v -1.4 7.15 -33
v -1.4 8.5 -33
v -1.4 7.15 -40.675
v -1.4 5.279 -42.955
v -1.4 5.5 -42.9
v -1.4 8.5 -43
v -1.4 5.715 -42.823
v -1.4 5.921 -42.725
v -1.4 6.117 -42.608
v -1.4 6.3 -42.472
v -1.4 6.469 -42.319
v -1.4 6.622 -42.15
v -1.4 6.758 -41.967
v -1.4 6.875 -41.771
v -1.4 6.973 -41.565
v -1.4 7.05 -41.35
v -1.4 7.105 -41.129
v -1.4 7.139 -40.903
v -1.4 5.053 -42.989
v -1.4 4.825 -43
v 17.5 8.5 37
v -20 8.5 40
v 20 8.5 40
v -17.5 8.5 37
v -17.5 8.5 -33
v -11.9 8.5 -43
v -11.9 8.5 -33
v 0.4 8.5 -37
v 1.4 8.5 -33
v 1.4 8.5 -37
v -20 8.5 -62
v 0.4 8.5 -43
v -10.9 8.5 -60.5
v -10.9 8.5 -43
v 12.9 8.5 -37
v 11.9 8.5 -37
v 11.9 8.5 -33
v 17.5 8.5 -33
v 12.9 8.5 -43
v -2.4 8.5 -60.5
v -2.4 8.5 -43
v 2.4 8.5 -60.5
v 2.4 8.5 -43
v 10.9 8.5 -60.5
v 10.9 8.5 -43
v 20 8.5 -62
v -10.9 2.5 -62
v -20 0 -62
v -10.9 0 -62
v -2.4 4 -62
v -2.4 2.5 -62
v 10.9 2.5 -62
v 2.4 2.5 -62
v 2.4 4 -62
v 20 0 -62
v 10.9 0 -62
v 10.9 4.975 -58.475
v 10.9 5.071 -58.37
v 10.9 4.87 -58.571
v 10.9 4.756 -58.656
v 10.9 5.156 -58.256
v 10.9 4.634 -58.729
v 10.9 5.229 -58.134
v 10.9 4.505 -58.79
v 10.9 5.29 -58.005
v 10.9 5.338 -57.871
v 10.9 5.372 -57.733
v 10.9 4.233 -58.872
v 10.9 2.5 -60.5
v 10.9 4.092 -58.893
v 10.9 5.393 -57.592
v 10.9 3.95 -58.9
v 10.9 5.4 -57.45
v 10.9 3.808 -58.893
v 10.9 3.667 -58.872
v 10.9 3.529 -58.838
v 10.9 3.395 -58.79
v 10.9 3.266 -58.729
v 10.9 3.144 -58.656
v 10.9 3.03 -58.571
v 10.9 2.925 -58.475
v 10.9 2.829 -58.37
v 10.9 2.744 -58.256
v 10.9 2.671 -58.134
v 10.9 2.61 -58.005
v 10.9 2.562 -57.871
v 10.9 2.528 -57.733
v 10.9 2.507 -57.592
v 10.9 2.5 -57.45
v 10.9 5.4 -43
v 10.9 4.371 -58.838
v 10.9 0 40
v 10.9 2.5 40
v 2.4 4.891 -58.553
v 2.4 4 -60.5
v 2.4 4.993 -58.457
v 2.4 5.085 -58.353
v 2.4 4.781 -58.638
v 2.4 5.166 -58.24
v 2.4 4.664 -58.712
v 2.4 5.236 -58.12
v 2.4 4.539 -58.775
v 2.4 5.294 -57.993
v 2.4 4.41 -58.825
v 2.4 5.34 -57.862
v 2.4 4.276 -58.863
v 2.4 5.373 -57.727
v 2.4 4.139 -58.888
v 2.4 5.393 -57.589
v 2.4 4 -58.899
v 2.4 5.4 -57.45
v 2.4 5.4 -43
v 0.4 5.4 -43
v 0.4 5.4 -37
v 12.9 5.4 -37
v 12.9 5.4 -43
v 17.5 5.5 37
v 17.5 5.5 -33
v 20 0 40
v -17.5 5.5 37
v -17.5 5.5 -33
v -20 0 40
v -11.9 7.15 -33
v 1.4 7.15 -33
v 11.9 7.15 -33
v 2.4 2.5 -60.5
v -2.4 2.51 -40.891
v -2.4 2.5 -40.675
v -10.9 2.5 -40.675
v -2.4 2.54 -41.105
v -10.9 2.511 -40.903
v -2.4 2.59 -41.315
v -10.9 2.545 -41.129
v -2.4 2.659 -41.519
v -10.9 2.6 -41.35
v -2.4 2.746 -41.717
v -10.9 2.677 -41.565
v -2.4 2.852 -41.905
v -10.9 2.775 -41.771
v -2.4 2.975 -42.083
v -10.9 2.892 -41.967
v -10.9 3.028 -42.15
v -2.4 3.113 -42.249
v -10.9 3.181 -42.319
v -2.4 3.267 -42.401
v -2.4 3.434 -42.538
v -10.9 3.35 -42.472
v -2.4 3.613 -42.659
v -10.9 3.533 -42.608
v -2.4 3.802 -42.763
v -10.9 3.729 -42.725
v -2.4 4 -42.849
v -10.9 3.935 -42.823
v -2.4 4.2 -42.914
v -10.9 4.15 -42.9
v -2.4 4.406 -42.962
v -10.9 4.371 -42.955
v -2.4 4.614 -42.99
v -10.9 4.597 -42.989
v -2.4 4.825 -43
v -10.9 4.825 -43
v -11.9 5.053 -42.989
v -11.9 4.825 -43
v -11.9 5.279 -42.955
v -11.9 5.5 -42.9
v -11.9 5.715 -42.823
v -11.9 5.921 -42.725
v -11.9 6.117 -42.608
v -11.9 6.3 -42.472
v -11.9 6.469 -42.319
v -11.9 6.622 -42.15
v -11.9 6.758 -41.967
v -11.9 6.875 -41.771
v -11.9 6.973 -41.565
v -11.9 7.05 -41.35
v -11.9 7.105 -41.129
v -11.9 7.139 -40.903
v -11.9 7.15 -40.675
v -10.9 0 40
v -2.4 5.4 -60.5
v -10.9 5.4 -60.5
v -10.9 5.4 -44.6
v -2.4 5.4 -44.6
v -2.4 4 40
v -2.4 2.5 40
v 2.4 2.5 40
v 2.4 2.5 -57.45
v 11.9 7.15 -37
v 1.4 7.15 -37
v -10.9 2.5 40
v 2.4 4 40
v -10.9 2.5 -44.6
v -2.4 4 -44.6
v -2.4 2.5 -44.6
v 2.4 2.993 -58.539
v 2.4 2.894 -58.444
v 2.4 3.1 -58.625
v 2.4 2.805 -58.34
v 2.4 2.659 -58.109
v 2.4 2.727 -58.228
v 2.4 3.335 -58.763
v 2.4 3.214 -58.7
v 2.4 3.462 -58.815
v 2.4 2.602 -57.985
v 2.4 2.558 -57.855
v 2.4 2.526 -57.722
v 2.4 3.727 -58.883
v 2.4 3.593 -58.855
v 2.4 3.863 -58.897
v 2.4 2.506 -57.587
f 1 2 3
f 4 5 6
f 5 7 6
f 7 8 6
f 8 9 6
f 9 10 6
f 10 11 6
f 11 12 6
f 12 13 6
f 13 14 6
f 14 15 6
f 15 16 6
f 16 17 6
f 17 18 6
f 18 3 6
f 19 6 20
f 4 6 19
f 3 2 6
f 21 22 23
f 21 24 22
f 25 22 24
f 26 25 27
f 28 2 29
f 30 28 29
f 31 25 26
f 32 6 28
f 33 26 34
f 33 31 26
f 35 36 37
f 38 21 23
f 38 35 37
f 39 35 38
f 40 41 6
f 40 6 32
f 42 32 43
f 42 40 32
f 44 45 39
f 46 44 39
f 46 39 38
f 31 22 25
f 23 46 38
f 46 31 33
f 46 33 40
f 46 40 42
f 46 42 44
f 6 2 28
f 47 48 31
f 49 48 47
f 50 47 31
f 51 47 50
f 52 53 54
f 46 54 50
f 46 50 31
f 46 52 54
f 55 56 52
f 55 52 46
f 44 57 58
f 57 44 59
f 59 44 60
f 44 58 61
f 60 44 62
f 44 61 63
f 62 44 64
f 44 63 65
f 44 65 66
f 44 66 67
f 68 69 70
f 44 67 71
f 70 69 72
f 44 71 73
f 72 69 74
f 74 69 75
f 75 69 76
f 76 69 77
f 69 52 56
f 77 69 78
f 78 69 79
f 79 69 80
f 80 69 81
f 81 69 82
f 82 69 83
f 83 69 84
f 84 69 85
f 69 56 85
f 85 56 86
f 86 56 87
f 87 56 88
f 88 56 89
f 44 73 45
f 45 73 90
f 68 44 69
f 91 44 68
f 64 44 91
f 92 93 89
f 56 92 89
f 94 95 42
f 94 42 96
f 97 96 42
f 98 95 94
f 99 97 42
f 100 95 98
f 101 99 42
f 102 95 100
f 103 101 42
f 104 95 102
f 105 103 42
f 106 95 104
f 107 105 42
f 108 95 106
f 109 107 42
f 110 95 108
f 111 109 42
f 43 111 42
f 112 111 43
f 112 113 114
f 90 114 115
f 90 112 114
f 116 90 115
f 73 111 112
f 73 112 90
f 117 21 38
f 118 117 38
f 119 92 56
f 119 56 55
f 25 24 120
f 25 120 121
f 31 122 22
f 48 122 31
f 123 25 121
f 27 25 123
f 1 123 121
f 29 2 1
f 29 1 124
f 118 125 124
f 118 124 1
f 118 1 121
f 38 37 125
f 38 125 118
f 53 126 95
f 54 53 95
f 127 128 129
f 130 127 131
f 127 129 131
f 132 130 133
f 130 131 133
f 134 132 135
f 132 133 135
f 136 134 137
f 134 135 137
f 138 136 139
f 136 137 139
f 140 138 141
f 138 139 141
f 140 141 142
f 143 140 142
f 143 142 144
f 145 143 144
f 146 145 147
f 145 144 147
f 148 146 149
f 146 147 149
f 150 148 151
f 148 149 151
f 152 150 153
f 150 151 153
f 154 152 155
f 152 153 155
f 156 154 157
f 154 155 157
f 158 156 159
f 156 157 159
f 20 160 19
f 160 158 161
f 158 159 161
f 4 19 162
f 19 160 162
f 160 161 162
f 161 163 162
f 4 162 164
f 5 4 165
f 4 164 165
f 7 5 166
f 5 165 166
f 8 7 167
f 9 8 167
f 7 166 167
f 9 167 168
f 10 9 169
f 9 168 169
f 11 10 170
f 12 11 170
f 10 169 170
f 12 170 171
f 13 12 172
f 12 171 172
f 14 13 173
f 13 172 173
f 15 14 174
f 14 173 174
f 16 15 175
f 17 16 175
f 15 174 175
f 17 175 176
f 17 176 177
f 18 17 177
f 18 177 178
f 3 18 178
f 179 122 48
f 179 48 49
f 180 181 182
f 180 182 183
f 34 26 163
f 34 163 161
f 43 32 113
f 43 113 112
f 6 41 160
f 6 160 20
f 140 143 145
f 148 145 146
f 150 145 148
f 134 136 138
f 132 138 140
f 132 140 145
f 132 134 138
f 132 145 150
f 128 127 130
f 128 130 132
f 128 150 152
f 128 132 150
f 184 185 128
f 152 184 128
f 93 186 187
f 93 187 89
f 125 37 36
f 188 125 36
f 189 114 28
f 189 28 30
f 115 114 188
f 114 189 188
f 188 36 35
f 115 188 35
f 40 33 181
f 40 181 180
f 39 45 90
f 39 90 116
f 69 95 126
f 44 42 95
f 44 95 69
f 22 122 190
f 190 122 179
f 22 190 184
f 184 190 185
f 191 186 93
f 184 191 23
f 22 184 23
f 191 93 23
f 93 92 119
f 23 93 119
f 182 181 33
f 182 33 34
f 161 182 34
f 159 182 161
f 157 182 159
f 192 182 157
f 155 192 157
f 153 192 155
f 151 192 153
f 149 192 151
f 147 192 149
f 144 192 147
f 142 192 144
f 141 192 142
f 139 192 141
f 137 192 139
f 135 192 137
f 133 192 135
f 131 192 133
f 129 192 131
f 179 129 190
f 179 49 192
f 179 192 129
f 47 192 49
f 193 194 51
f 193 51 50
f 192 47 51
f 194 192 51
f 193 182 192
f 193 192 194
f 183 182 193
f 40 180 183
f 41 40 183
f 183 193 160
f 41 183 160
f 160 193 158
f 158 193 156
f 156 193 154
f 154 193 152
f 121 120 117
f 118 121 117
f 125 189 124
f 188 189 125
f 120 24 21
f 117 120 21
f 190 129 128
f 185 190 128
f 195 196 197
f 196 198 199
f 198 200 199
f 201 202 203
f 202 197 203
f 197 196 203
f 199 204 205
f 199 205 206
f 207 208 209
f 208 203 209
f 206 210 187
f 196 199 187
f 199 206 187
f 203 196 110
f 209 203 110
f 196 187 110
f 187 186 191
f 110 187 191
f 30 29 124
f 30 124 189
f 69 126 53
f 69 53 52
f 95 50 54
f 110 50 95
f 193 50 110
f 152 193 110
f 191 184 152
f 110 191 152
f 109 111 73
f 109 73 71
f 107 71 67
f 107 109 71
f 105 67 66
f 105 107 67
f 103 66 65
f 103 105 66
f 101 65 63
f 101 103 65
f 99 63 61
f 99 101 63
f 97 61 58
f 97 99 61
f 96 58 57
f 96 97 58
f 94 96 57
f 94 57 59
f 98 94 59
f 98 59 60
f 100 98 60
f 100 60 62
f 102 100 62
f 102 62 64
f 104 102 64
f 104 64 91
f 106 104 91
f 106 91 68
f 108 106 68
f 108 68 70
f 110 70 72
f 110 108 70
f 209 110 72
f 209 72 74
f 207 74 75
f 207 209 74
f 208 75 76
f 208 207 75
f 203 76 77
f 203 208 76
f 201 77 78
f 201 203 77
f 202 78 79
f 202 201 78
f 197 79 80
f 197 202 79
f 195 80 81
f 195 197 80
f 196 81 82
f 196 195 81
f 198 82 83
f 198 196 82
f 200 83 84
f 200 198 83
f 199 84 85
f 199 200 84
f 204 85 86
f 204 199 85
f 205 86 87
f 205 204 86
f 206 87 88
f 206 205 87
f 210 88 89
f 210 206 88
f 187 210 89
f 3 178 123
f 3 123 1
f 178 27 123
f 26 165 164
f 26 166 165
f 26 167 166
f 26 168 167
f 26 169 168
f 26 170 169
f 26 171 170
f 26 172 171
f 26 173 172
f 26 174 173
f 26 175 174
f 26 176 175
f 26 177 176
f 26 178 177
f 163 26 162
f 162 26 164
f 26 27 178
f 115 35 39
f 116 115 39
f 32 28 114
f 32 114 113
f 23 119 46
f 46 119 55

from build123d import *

# Parameters (mm, degrees)
SKETCH1_W               = 40
SKETCH1_H               = 102
BOSS_EXTRUDE1_DEPTH     = 8.5
SKETCH2_W               = 35
SKETCH2_H               = 70
CUT_EXTRUDE1_DEPTH      = 3
SKETCH3_W               = 10.5
SKETCH3_H               = 10
CUT_EXTRUDE2_DEPTH      = 1.35
SKETCH4_W               = 12.5
SKETCH4_H               = 6
CUT_EXTRUDE3_DEPTH      = 3.1
SKETCH5_W               = 8.5
SKETCH5_H               = 17.5
PCB_PLACE_DEPTH         = 3.1
SKETCH6_W               = 8.5
SKETCH6_H               = 1.6
NICKEL_STRIP_HOLE_DEPTH = 66.369411807
CUT_EXTRUDE4_REACH      = 67.698
SKETCH7_W               = 8.5
SKETCH7_H               = 17.5
SKETCH8_W               = 8.5
SKETCH8_H               = 1.6
CUT_EXTRUDE5_DEPTH      = 10
SKETCH9_W               = 8.5
SKETCH9_H               = 102
NICKEL_STRIP_RAIL_DEPTH = 2.5
FILLET3_R               = 2.325
FILLET4_RADIUS          = 1.45
FILLET4_LENGTH          = 8.5
CUT_EXTRUDE6_REACH      = 106.289
SKETCH10_W              = 4.8
SKETCH10_H              = 4


with BuildPart() as part:
    # Sketch1 → Boss-Extrude1 (new body)
    with BuildSketch(Plane(origin=(0, 0, 0), x_dir=(1, 0, 0), z_dir=(0, 1, 0))):
        with Locations((0, 11)):
            Rectangle(SKETCH1_W, SKETCH1_H)
    extrude(amount=BOSS_EXTRUDE1_DEPTH)

    # Sketch2 → Cut-Extrude1 (cut)
    with BuildSketch(Plane(origin=(0, 8.5, 0), x_dir=(1, 0, 0), z_dir=(0, 1, 0))):
        with Locations((0, -2)):
            Rectangle(SKETCH2_W, SKETCH2_H)
    extrude(amount=-CUT_EXTRUDE1_DEPTH, mode=Mode.SUBTRACT)

    # Sketch3 → Cut-Extrude2 (cut)
    with BuildSketch(Plane(origin=(0, 8.5, 0), x_dir=(1, 0, 0), z_dir=(0, 1, 0))):
        with Locations((-6.65, 38)):
            Rectangle(SKETCH3_W, SKETCH3_H)
        with Locations((6.65, 38)):
            Rectangle(SKETCH3_W, SKETCH3_H)
    extrude(amount=-CUT_EXTRUDE2_DEPTH, mode=Mode.SUBTRACT)

    # Sketch4 → Cut-Extrude3 (cut)
    with BuildSketch(Plane(origin=(0, 8.5, 0), x_dir=(1, 0, 0), z_dir=(0, 1, 0))):
        with Locations((6.65, 40)):
            Rectangle(SKETCH4_W, SKETCH4_H)
    extrude(amount=-CUT_EXTRUDE3_DEPTH, mode=Mode.SUBTRACT)

    # Sketch5 → PCB place (cut)
    with BuildSketch(Plane(origin=(0, 8.5, 0), x_dir=(1, 0, 0), z_dir=(0, 1, 0))):
        with Locations((6.65, 51.75)):
            Rectangle(SKETCH5_W, SKETCH5_H)
    extrude(amount=-PCB_PLACE_DEPTH, mode=Mode.SUBTRACT)

    # Sketch6 → Nickel strip hole (cut, through all)
    with BuildSketch(Plane(origin=(0, 5.4, 0), x_dir=(1, 0, 0), z_dir=(0, 1, 0))):
        with Locations((6.65, 59.7)):
            Rectangle(SKETCH6_W, SKETCH6_H)
    extrude(amount=-NICKEL_STRIP_HOLE_DEPTH, mode=Mode.SUBTRACT)

    # Cut-Extrude4: up to this face of the body (flat: up to its plane)
    cut_extrude4_end = Plane(part.part.faces().sort_by_distance((6.65, 5.4, -47.042077088))[0])
    # Sketch7 → Cut-Extrude4 (cut, up to the picked face)
    with BuildSketch(Plane(origin=(0, 8.5, 0), x_dir=(1, 0, 0), z_dir=(0, 1, 0)), mode=Mode.PRIVATE) as cut_extrude4_sk1:
        with Locations((-6.65, 51.75)):
            Rectangle(SKETCH7_W, SKETCH7_H)
    cut_extrude4_tool1 = split(extrude(cut_extrude4_sk1.sketch, amount=-CUT_EXTRUDE4_REACH, mode=Mode.PRIVATE), bisect_by=cut_extrude4_end, keep=Keep.BOTH, mode=Mode.PRIVATE)
    add(cut_extrude4_tool1.solids().sort_by(Axis((-6.65, 8.5, -51.75), (0, -1, 0)))[0], mode=Mode.SUBTRACT)

    # Sketch8 → Cut-Extrude5 (cut)
    with BuildSketch(Plane(origin=(0, 5.4, 0), x_dir=(1, 0, 0), z_dir=(0, 1, 0))):
        with Locations((-6.65, 43.8)):
            Rectangle(SKETCH8_W, SKETCH8_H)
    extrude(amount=-CUT_EXTRUDE5_DEPTH, mode=Mode.SUBTRACT)

    # Sketch9 → Nickel strip rail (cut)
    with BuildSketch(Plane.XZ):
        with Locations((-6.65, -11)):
            Rectangle(SKETCH9_W, SKETCH9_H)
        with Locations((6.65, -11)):
            Rectangle(SKETCH9_W, SKETCH9_H)
    extrude(amount=-NICKEL_STRIP_RAIL_DEPTH, mode=Mode.SUBTRACT)

    # Fillet3
    # the kernel refuses this fillet: 2.325 mm, written as the material it takes off along each edge
    with BuildSketch(Plane(origin=(3.4125, 7.15, -43), x_dir=(0, 0, 1), z_dir=(-1, 0, 0))) as fillet3_piece_1_section:
        with BuildLine():
            CenterArc((FILLET3_R, -FILLET3_R), FILLET3_R, 90, 90)
            Line((0, -FILLET3_R), (0, 0))
            Line((0, 0), (FILLET3_R, 0))
        make_face()
    fillet3_piece_1 = extrude(amount=20.125, mode=Mode.PRIVATE)
    fillet3_piece_1 = split(fillet3_piece_1, bisect_by=Plane(origin=(-11.9, 7.15, -43), z_dir=(1, 0, 0)), keep=Keep.TOP, mode=Mode.PRIVATE)
    fillet3_piece_1 = split(fillet3_piece_1, bisect_by=Plane(origin=(-1.4, 7.15, -43), z_dir=(-1, 0, 0)), keep=Keep.TOP, mode=Mode.PRIVATE)
    add(fillet3_piece_1, mode=Mode.SUBTRACT)
    with BuildSketch(Plane(origin=(-10.9, 2.5, -43), x_dir=(0, 1, 0), z_dir=(1, 0, 0))) as fillet3_piece_2:
        with BuildLine():
            CenterArc((FILLET3_R, FILLET3_R), FILLET3_R, 180, 90)
            Line((0, FILLET3_R), (0, 0))
            Line((0, 0), (FILLET3_R, 0))
        make_face()
    extrude(amount=8.5, mode=Mode.SUBTRACT)

    # Fillet4: full round fillet: the end face becomes a half cylinder, R = half its width
    fillet4_face = Plane((6.65, 3.95, -58.9), x_dir=(-1, 0, 0), z_dir=(0, 0, -1))  # on the end face: x along it, z out of the body
    fillet4_slab = fillet4_face.offset(-FILLET4_RADIUS / 2) * Box(FILLET4_LENGTH, 2 * FILLET4_RADIUS, FILLET4_RADIUS, mode=Mode.PRIVATE)  # the body's end, R deep
    fillet4_round = Plane((6.65, 3.95, -57.45), x_dir=(0, 0, -1), z_dir=(-1, 0, 0)) * Cylinder(FILLET4_RADIUS, FILLET4_LENGTH, mode=Mode.PRIVATE)  # its axis R under the face
    add(fillet4_slab - fillet4_round, mode=Mode.SUBTRACT)

    # Cut-Extrude6: up to this face of the body (flat: up to its plane)
    cut_extrude6_end = Plane(part.part.faces().sort_by_distance((0, 4.678571429, -62))[0])
    # Sketch10 → Cut-Extrude6 (cut, up to the picked face)
    with BuildSketch(Plane.XY.offset(40), mode=Mode.PRIVATE) as cut_extrude6_sk1:
        with Locations((0, 2)):
            Rectangle(SKETCH10_W, SKETCH10_H)
    cut_extrude6_tool1 = split(extrude(cut_extrude6_sk1.sketch, amount=-CUT_EXTRUDE6_REACH, mode=Mode.PRIVATE), bisect_by=cut_extrude6_end, keep=Keep.BOTH, mode=Mode.PRIVATE)
    add(cut_extrude6_tool1.solids().sort_by(Axis((0, 2, 40), (0, 0, -1)))[0], mode=Mode.SUBTRACT)


solid = part.part
